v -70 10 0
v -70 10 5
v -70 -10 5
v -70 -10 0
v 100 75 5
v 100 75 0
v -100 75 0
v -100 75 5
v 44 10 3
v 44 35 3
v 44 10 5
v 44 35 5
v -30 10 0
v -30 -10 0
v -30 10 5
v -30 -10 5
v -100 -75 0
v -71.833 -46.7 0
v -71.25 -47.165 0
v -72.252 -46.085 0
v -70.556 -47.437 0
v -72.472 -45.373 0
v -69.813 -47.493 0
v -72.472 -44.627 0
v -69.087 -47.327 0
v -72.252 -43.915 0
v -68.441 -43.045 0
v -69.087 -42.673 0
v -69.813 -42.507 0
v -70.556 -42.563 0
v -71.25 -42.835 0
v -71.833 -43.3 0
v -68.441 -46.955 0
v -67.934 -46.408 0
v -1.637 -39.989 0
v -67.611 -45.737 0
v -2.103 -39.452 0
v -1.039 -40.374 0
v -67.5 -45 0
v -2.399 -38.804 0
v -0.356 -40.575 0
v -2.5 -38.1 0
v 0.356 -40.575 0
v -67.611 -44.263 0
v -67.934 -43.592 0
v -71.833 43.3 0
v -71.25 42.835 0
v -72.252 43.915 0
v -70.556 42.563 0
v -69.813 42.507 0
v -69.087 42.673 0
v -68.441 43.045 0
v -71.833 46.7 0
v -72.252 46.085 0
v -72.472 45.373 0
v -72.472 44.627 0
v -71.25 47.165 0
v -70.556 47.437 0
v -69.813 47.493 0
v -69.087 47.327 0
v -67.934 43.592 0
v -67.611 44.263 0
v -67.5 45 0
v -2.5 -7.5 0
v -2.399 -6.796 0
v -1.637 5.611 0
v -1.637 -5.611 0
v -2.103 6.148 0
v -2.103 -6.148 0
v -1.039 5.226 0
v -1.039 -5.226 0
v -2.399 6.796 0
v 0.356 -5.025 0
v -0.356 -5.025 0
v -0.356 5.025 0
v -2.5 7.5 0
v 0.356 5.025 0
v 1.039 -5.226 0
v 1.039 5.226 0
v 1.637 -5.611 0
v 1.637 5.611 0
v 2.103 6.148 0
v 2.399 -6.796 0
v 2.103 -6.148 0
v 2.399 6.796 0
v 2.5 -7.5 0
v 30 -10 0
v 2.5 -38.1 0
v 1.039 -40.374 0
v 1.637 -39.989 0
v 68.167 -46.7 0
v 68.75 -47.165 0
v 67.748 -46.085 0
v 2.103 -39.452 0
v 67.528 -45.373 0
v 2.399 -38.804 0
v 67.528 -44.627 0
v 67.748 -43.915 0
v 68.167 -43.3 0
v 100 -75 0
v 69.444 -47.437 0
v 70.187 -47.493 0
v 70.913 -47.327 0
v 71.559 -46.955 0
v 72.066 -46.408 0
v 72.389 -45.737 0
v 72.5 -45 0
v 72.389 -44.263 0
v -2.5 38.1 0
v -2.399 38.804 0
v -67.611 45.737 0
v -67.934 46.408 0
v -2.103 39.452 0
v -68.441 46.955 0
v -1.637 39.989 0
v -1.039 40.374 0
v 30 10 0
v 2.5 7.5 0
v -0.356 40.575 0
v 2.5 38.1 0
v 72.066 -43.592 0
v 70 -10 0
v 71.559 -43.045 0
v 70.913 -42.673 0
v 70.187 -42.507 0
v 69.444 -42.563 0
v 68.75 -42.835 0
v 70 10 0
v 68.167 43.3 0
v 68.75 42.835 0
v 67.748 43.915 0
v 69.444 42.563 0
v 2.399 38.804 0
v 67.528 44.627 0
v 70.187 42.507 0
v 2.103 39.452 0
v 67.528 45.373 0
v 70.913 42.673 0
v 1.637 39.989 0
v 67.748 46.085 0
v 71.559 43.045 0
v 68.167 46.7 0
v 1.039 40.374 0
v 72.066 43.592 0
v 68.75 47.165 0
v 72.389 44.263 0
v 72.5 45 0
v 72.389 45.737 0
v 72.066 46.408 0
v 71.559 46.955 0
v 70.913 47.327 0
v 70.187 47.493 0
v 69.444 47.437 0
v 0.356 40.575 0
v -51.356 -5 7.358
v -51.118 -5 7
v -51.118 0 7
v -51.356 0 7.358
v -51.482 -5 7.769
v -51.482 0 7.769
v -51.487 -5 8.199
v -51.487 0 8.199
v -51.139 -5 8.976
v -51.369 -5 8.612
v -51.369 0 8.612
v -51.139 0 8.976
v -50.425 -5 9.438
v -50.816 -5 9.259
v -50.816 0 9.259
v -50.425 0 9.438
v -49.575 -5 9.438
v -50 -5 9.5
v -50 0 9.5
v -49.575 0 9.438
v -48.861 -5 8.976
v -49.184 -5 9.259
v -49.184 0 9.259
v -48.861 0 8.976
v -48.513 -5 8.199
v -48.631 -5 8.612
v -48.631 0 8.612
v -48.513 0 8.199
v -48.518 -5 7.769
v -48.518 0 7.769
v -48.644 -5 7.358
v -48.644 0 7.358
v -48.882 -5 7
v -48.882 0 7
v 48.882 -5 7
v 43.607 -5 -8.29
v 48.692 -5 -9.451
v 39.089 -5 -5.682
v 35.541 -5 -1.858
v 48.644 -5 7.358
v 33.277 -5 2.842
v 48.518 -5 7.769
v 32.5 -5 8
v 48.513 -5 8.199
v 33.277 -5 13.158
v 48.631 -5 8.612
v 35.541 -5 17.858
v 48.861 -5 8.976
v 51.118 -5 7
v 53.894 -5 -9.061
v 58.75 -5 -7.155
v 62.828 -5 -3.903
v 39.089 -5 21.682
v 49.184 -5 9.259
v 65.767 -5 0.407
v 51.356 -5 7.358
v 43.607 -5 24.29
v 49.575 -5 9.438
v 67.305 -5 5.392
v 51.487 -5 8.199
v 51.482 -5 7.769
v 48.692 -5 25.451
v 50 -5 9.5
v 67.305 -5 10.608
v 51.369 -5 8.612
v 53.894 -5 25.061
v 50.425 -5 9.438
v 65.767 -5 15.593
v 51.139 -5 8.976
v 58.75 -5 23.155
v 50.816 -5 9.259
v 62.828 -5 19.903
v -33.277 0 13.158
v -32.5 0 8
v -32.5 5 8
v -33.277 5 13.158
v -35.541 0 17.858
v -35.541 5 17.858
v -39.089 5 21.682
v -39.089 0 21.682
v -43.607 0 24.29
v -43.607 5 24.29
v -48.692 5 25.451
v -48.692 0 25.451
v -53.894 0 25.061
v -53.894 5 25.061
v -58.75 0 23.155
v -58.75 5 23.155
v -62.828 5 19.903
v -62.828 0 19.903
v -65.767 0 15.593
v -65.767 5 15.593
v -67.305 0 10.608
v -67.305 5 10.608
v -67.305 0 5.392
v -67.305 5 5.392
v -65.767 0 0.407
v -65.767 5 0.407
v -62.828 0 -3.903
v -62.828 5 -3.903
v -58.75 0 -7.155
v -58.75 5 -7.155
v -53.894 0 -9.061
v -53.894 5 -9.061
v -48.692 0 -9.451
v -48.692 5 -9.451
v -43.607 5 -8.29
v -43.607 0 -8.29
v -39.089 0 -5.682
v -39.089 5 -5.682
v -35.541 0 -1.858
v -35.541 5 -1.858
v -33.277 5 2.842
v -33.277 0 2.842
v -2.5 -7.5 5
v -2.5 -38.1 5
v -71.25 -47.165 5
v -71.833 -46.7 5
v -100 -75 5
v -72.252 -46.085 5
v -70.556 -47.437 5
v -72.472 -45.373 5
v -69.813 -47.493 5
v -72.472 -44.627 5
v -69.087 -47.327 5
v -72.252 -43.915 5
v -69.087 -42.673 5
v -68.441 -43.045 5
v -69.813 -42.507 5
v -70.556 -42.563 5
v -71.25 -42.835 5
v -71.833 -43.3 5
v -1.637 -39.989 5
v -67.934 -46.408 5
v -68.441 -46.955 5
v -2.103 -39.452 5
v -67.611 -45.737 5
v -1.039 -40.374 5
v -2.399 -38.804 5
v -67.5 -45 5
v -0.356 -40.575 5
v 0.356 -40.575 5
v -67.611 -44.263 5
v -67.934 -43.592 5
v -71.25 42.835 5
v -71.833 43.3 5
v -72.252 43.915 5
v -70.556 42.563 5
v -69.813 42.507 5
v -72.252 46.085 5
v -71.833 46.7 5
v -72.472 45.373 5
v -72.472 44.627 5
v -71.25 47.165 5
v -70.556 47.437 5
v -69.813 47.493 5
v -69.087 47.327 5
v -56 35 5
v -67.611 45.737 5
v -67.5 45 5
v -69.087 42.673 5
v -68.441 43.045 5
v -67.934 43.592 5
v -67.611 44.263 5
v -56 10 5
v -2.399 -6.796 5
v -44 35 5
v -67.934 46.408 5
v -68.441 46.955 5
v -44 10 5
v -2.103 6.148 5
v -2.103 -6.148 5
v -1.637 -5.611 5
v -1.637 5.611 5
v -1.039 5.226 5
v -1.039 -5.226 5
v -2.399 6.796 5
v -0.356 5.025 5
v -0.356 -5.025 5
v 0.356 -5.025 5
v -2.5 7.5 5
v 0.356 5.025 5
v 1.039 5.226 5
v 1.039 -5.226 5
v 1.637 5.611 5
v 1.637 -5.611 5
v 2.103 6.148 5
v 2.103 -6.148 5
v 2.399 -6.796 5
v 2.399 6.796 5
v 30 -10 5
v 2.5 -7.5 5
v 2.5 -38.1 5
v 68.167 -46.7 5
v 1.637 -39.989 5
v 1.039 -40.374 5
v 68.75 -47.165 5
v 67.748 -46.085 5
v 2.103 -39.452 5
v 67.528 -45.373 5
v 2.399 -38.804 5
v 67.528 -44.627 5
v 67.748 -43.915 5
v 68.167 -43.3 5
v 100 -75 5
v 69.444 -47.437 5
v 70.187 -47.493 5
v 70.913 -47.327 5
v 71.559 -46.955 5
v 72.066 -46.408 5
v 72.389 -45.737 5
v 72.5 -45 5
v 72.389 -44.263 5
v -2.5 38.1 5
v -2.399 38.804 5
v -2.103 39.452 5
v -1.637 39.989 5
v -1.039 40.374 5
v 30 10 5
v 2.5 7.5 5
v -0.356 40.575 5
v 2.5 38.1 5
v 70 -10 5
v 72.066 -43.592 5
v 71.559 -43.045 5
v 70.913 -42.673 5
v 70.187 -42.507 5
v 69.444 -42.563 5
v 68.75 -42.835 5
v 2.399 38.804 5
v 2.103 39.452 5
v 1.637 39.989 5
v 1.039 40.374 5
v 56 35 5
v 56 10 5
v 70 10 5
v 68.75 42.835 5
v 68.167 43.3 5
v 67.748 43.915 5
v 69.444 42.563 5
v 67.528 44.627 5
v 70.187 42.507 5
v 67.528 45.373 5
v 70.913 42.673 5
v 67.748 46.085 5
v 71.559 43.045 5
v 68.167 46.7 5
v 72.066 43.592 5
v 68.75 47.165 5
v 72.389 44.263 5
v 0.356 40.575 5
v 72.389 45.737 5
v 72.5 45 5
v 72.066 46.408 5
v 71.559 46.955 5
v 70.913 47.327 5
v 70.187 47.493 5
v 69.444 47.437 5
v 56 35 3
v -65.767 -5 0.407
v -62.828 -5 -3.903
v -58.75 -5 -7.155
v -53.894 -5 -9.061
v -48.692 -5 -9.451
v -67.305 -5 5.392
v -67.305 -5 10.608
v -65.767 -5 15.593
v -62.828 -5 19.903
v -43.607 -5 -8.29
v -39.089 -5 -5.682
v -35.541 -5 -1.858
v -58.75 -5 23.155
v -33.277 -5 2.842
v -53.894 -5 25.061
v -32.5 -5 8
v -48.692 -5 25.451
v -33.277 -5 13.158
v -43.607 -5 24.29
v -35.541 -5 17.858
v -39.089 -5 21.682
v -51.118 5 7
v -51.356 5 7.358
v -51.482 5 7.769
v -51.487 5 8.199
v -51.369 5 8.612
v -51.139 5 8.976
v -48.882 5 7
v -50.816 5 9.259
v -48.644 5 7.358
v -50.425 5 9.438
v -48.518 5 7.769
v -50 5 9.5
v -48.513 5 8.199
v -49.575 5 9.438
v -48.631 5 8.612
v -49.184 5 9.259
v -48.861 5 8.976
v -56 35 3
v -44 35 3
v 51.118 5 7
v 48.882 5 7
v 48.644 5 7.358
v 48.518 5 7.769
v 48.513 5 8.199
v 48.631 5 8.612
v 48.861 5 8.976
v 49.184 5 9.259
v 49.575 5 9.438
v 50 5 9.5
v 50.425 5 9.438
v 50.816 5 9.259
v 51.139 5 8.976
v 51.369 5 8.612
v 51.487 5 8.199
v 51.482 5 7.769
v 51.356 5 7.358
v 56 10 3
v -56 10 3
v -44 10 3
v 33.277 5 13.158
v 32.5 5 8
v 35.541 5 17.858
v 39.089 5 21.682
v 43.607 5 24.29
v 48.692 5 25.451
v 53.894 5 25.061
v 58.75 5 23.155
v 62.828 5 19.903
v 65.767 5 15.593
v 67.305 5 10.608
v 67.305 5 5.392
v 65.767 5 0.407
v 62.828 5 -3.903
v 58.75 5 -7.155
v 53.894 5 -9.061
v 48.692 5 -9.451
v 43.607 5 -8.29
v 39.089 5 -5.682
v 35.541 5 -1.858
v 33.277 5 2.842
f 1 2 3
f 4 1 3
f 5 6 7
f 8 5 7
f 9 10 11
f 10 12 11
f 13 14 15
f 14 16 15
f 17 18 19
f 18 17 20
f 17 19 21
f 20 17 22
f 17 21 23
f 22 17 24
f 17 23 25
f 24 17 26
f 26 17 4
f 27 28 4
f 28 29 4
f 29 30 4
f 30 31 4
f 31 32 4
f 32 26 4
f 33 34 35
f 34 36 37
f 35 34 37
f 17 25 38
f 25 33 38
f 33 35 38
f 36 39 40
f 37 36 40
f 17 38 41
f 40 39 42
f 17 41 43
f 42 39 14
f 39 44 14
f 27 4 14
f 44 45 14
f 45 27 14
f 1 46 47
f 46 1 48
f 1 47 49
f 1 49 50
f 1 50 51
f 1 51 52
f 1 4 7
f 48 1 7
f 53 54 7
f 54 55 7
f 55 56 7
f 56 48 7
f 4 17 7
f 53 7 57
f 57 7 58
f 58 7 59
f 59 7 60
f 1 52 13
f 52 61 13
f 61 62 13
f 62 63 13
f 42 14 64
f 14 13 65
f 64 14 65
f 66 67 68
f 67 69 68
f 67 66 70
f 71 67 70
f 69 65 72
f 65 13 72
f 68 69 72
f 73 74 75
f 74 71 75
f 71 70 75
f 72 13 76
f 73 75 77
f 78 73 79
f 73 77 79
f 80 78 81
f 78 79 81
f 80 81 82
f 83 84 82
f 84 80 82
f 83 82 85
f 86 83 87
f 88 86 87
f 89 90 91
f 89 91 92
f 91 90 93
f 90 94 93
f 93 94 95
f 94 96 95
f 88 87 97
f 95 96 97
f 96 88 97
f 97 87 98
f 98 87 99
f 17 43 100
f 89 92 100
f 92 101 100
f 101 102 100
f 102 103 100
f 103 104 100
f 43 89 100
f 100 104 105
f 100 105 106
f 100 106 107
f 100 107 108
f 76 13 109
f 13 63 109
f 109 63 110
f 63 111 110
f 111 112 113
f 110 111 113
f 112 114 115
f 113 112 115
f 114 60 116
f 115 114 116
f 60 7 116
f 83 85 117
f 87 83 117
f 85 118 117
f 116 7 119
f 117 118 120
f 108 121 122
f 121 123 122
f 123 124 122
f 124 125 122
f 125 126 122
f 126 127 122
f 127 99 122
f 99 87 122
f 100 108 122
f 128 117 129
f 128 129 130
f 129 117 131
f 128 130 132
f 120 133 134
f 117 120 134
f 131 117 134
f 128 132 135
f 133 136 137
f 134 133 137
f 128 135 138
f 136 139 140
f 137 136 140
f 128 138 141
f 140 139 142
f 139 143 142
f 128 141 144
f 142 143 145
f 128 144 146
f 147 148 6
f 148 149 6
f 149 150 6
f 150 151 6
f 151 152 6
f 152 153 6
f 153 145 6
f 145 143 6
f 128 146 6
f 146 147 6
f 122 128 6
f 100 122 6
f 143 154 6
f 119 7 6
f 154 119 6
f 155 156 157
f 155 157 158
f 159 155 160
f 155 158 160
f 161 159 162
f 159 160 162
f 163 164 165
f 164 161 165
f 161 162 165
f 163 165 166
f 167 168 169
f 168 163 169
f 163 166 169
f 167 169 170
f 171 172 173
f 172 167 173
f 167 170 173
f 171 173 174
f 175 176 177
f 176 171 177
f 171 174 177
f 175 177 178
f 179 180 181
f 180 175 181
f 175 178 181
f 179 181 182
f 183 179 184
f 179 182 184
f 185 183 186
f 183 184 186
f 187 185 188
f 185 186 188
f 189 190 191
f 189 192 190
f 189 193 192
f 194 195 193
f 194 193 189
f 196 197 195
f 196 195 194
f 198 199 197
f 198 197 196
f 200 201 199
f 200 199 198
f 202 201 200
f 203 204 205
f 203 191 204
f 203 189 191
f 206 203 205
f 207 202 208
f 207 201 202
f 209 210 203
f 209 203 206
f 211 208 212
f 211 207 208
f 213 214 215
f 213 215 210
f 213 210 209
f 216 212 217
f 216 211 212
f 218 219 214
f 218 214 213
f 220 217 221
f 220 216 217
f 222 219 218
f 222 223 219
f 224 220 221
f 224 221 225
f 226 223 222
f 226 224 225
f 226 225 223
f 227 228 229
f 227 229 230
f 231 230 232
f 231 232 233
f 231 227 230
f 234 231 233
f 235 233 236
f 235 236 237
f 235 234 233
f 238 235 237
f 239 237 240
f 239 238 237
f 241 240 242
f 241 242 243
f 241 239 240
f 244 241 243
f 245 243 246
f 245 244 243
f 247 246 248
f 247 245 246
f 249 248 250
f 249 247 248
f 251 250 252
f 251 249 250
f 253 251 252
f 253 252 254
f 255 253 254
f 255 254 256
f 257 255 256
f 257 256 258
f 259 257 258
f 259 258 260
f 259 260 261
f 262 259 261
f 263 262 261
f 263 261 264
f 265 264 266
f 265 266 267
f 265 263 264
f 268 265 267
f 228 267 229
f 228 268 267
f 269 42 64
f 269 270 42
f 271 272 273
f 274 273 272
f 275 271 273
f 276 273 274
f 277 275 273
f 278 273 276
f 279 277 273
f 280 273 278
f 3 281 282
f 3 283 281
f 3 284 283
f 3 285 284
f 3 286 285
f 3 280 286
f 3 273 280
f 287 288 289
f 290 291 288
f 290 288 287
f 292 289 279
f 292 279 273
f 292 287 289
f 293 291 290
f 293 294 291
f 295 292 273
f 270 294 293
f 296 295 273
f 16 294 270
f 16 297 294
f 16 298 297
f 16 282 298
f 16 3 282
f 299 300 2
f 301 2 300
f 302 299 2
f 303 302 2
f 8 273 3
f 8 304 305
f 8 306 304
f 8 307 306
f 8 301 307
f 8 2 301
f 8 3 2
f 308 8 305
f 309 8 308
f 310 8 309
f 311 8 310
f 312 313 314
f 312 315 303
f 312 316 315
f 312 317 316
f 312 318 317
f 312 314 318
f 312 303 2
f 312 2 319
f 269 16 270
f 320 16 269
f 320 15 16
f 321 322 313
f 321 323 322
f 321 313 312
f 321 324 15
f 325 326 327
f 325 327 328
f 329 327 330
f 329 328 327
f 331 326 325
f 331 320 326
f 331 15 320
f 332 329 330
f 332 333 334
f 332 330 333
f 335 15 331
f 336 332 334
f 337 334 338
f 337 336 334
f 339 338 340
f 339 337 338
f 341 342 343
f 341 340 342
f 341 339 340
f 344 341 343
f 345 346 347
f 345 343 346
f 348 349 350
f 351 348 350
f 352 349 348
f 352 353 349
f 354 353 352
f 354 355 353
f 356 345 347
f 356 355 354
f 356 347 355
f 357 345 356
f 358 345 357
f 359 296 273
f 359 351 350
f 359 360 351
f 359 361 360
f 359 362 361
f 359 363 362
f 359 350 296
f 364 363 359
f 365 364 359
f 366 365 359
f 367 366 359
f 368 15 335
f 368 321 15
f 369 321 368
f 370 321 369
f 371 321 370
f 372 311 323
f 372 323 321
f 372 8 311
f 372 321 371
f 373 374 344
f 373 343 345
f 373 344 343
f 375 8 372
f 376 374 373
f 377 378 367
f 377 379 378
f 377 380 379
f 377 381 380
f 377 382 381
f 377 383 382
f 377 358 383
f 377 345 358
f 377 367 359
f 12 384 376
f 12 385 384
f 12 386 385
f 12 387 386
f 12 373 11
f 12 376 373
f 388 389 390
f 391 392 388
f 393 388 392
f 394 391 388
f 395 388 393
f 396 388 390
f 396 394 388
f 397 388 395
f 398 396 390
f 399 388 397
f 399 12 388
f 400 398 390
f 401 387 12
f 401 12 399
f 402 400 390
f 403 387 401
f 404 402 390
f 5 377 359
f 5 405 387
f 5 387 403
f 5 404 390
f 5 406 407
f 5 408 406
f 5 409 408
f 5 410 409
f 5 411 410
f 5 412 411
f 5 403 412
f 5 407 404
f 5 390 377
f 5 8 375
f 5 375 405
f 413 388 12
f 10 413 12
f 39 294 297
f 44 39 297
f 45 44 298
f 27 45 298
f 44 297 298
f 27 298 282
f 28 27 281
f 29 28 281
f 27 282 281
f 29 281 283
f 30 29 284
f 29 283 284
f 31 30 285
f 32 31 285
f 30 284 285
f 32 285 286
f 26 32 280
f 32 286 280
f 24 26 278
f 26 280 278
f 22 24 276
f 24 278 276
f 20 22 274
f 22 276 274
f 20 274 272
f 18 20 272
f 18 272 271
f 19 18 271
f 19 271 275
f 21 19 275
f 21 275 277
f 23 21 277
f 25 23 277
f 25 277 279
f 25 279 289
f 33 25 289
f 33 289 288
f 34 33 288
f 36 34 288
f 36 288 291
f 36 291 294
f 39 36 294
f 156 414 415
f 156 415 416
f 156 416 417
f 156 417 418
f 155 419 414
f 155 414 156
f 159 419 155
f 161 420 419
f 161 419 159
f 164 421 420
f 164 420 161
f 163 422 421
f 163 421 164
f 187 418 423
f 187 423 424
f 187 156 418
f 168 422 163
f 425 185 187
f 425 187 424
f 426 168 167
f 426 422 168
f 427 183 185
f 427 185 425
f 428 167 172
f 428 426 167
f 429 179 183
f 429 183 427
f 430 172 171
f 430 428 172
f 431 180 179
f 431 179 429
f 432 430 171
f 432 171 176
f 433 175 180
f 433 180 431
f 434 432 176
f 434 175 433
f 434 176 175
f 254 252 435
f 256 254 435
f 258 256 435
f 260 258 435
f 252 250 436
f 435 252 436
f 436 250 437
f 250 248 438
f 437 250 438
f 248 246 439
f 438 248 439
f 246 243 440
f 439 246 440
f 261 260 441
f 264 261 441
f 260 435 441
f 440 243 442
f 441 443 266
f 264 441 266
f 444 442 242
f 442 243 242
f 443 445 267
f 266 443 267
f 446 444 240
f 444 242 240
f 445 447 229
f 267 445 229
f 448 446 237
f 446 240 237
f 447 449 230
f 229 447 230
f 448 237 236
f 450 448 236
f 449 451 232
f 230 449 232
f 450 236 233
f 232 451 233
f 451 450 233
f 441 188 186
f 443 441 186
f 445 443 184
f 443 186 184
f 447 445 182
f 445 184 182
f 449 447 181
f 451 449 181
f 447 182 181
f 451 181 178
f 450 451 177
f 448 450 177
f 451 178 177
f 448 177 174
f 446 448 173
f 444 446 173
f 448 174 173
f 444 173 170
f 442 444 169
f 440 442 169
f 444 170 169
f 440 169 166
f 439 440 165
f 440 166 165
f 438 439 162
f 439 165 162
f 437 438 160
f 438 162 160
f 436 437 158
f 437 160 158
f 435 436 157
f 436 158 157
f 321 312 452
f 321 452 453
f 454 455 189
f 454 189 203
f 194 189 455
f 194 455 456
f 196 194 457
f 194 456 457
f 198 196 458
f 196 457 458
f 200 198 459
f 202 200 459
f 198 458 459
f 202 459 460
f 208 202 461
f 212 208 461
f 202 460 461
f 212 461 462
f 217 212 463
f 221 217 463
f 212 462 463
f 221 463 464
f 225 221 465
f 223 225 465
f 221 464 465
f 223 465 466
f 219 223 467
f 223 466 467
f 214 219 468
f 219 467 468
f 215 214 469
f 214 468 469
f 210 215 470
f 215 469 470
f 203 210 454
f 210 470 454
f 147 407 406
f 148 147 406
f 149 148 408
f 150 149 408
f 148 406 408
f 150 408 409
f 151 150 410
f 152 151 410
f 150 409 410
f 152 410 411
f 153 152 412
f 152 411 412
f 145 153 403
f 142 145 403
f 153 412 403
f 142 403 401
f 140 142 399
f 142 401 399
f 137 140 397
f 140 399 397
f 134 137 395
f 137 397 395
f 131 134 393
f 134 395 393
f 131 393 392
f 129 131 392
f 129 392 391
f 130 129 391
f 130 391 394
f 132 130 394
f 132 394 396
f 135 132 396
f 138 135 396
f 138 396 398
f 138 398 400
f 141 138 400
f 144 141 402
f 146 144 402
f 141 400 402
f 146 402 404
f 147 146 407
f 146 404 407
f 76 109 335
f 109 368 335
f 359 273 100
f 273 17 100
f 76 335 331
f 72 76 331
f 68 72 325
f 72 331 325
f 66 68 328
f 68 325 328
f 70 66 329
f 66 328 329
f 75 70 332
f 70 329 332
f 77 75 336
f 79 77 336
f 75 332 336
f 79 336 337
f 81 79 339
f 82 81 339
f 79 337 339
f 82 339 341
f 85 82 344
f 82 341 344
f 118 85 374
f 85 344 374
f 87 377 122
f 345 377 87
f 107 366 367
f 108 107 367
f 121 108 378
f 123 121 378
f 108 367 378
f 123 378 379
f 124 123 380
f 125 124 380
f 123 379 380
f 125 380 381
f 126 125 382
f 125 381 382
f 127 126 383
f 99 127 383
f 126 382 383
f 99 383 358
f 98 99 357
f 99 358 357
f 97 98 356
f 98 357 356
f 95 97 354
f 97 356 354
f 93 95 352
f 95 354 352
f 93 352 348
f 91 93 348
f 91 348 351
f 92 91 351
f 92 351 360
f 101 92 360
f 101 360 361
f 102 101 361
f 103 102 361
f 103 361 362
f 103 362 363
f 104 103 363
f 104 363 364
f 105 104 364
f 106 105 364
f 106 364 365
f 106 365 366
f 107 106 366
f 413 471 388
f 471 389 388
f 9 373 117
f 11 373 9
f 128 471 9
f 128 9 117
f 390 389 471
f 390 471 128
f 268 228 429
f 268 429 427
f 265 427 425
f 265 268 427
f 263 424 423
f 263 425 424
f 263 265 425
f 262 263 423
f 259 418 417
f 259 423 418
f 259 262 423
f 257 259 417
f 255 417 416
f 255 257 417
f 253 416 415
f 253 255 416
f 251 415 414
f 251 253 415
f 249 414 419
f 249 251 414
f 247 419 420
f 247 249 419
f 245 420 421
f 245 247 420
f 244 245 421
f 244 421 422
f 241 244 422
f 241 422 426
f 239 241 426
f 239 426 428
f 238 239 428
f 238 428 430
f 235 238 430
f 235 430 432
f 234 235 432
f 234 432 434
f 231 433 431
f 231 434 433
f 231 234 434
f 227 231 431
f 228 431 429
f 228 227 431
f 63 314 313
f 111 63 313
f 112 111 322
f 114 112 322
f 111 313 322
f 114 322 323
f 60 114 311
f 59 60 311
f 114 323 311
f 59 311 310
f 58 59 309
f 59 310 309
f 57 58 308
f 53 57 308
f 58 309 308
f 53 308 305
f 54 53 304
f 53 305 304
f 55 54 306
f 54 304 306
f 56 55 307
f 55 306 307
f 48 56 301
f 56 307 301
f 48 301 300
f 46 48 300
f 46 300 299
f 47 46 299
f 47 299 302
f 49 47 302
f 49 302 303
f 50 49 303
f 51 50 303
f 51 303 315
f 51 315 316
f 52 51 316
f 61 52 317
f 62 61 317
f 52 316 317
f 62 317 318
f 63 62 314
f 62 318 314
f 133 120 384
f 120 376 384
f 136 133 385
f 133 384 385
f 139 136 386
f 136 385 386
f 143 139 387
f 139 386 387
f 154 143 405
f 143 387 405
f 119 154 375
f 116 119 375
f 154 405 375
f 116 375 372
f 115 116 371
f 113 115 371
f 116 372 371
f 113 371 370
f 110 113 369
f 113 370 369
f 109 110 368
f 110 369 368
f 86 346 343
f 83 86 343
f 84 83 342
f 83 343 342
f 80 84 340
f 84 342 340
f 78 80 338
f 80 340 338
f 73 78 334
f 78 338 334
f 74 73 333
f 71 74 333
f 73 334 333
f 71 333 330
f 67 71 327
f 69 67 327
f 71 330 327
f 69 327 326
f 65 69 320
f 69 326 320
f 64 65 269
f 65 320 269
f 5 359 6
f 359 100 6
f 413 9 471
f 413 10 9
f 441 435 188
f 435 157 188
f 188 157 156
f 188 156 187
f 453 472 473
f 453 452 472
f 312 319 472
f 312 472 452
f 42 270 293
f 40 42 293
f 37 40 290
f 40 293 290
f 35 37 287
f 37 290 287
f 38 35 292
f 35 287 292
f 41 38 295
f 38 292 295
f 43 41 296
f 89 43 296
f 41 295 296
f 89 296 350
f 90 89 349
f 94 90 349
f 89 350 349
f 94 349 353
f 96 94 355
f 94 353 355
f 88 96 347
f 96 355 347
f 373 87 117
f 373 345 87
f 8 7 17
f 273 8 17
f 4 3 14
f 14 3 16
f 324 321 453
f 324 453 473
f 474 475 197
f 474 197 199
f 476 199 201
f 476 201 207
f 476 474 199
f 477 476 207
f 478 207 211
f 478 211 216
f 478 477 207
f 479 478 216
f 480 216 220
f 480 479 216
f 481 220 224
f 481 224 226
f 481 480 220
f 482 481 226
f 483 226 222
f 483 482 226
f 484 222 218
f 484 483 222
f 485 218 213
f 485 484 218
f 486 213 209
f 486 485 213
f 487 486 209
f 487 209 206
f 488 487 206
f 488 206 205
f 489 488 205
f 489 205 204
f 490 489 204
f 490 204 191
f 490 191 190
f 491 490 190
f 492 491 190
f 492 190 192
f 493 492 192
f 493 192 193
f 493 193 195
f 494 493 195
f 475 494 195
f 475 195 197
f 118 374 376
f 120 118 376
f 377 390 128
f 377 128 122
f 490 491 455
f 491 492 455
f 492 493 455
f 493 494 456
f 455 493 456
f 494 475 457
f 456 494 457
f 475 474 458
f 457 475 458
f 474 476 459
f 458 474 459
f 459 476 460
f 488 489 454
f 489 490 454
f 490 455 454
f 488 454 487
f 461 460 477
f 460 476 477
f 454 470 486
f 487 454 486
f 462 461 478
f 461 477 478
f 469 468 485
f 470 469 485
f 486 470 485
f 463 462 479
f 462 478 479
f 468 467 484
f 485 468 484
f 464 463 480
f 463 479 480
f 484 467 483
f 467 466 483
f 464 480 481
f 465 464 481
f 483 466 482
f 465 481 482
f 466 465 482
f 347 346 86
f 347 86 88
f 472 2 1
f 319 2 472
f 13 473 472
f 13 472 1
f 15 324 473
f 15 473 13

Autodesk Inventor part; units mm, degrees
ref_plane "YZ Plane" through (0, 0, 0) normal (1, 0, 0) x (0, 1, 0)
ref_plane "XZ Plane" through (0, 0, 0) normal (0, 1, 0) x (-1, 0, 0)
ref_plane "XY Plane" through (0, 0, 0) normal (0, 0, 1) x (1, 0, 0)
sketch "Эскиз1" plane through (0, 0, 0) normal (0, 0, 1) x (1, 0, 0)
  line L0 (-100, -75) -> (100, -75)
  line L1 (100, -75) -> (100, 75)
  line L2 (100, 75) -> (-100, 75)
  line L3 (-100, 75) -> (-100, -75)
  line L4 (-100, -75) -> (100, 75) construction
  line L5 (100, -75) -> (-100, 75) construction
  point P0 (0, 0)
  dimension "d0" = 200
  dimension "d1" = 150
extrude "Выдавливание1" add sketch "Эскиз1" along normal blind 5
sketch "Эскиз2" plane through (0, 0, 5) normal (0, 0, 1) x (1, 0, 0)
  line L0 (100, -75) -> (100, 75) construction
  line L1 (100, 0) -> (-100, 0) construction
  line L2 (-100, 75) -> (-100, -75) construction
  line L3 (100, 75) -> (-100, 75) construction
  line L4 (0, 75) -> (0, -75) construction
  line L5 (-100, -75) -> (100, -75) construction
  line L6 (-100, -10) -> (100, -10) construction
  line L7 (100, -10) -> (100, 10) construction
  line L8 (100, 10) -> (-100, 10) construction
  line L9 (-100, 10) -> (-100, -10) construction
  line L10 (-100, -10) -> (100, 10) construction
  line L11 (100, -10) -> (-100, 10) construction
  line L12 (0, 0) -> (-100, 0) construction
  line L13 (-50, 0) -> (-50, 75) construction
  line L14 (0, 0) -> (100, 0) construction
  line L15 (50, 0) -> (50, 75) construction
  line L16 (-56, 10) -> (-56, 35)
  line L17 (-56, 35) -> (-44, 35)
  line L18 (-44, 35) -> (-44, 10)
  line L19 (-56, 10) -> (-44, 10)
  line L20 (56, 10) -> (56, 35)
  line L21 (56, 35) -> (44, 35)
  line L22 (44, 35) -> (44, 10)
  line L23 (56, 10) -> (44, 10)
  line L24 (-70, -10) -> (-30, -10)
  line L25 (-30, -10) -> (-30, 10)
  line L26 (-30, 10) -> (-70, 10)
  line L27 (-70, 10) -> (-70, -10)
  line L28 (-70, -10) -> (-30, 10) construction
  line L29 (-30, -10) -> (-70, 10) construction
  line L30 (70, -10) -> (30, -10)
  line L31 (30, -10) -> (30, 10)
  line L32 (30, 10) -> (70, 10)
  line L33 (70, 10) -> (70, -10)
  dimension "d4" = 20
  dimension "d7" = 25
  dimension "d8" = 40
extrude "Выдавливание2" cut sketch "Эскиз2" against normal blind 2 contours L16 L17 L18 L19 | L23 L22 L21 L20
extrude "Выдавливание3" cut sketch "Эскиз2" against normal blind 5 contours L19 L26 L25 L24 L27 | L32 L33 L30 L31 L23
sketch "Эскиз3" plane through (0, 0, 3) normal (0, 0, 1) x (1, 0, 0)
  line L0 (-56, 10) -> (-56, 35) projected
  line L1 (-44, 10) -> (-56, 10) projected
  line L2 (-44, 35) -> (-44, 10) projected
  line L3 (-56, 35) -> (-44, 35) projected
  line L4 (-44, 35) -> (-44, 10) projected
  point P0 (0, 0)
surface extrude "ВыдавПврх1" sketch "Эскиз3" along normal blind 10 shown yes curves L4 L1 L0 L3
boundary_patch "Участок поверхности1"
sketch "Эскиз4" plane through (-56, 10, 3) normal (0, -1, 0) x (1, 0, 0)
  line L0 (0, 10) -> (12, 10) construction
  line L1 (6, 10) -> (6, 0) construction
  line L2 (12, 0) -> (0, 0) construction
  line L3 (0, 0) -> (0, 10) construction
  line L4 (0, 5) -> (12, 5) construction
  line L5 (12, 0) -> (12, 10) construction
  arc A0 (7.118, 4) -> (4.882, 4) centre (6, 5) ccw
  line L6 (6, 3.5) -> (6, 4) construction
  line L7 (6, 4) -> (7.118, 4)
  line L8 (6, 4) -> (4.882, 4)
  point P0 (56, -3)
  dimension "d17" = 3
  dimension "d18" = 0.5
surface extrude "ВыдавПврх2" sketch "Эскиз4" along normal blind 10 shown yes curves L7 A0 L8
boundary_patch "Участок поверхности2"
mirror "Зеркальное отражение1" about plane through (0, 0, 0) normal (1, 0, 0) of "Участок поверхности1", "ВыдавПврх1", "ВыдавПврх2"
ref_plane "РабПлоскость1" through (-70, 0, 5) normal (0, -1, 0) x (1, 0, 0)
sketch "Эскиз5" plane through (-70, 0, 5) normal (0, -1, 0) x (1, 0, 0)
  arc A0 (21.118, 2) -> (18.882, 2) centre (20, 3) ccw projected
  line L0 (18.882, 2) -> (21.118, 2) projected
  circle A1 centre (20, 3) radius 17.5
  point P0 (70, -5)
  dimension "d23" = 35
extrude "Выдавливание4" add sketch "Эскиз5" along normal mid plane 10
mirror "Зеркальное отражение2" about plane through (0, 0, 0) normal (1, 0, 0) of "Выдавливание4"
sketch "Эскиз6" plane through (0, 0, 5) normal (0, 0, 1) x (1, 0, 0)
  line L0 (-100, -75) -> (100, -75) projected
  line L1 (100, -75) -> (100, 75) projected
  line L2 (100, 75) -> (-100, 75) projected
  line L3 (-100, 75) -> (-100, -75) projected
  line L4 (-44, 10) -> (-30, 10) projected
  line L5 (-30, 10) -> (-30, -10) projected
  line L6 (-30, -10) -> (-70, -10) projected
  line L7 (-70, -10) -> (-70, 10) projected
  line L8 (-70, 10) -> (-56, 10) projected
  line L9 (-56, 10) -> (-56, 35) projected
  line L10 (-56, 35) -> (-44, 35) projected
  line L11 (-44, 35) -> (-44, 10) projected
  line L12 (30, 10) -> (44, 10) projected
  line L13 (44, 10) -> (44, 35) projected
  line L14 (44, 35) -> (56, 35) projected
  line L15 (56, 35) -> (56, 10) projected
  line L16 (56, 10) -> (70, 10) projected
  line L17 (70, 10) -> (70, -10) projected
  line L18 (70, -10) -> (30, -10) projected
  line L19 (30, -10) -> (30, 10) projected
  line L20 (100, -75) -> (70, -75)
  line L21 (70, -75) -> (70, -45) construction
  line L22 (70, -45) -> (100, -45) construction
  line L23 (100, -45) -> (100, -75)
  circle A0 centre (70, -45) radius 2.5
  line L24 (-100, 0) -> (100, 0) construction
  line L25 (100, 75) -> (-100, 75) construction
  line L26 (0, 75) -> (0, -75) construction
  circle A1 centre (-70, -45) radius 2.5
  circle A2 centre (70, 45) radius 2.5
  circle A3 centre (-70, 45) radius 2.5
  point P0 (0, 0)
  dimension "d26" = 30
  dimension "d27" = 30
  dimension "d28" = 5
extrude "Выдавливание5" cut sketch "Эскиз6" against normal blind 10 contours A0 | A1 | A2 | A3
sketch "Эскиз7" plane through (0, 0, 5) normal (0, 0, 1) x (1, 0, 0)
  circle A0 centre (-70, 45) radius 2.5 projected
  circle A1 centre (70, -45) radius 2.5 projected
  circle A2 centre (-70, -45) radius 2.5 projected
  circle A3 centre (70, 45) radius 2.5 projected
  line L0 (-100, -75) -> (100, -75) projected
  line L1 (100, -75) -> (100, 75) projected
  line L2 (100, 75) -> (-100, 75) projected
  line L3 (-100, 75) -> (-100, -75) projected
  line L4 (-44, 10) -> (-30, 10) projected
  line L5 (-30, 10) -> (-30, -10) projected
  line L6 (-30, -10) -> (-70, -10) projected
  line L7 (-70, -10) -> (-70, 10) projected
  line L8 (-70, 10) -> (-56, 10) projected
  line L9 (-56, 10) -> (-56, 35) projected
  line L10 (-56, 35) -> (-44, 35) projected
  line L11 (-44, 35) -> (-44, 10) projected
  line L12 (30, 10) -> (44, 10) projected
  line L13 (44, 10) -> (44, 35) projected
  line L14 (44, 35) -> (56, 35) projected
  line L15 (56, 35) -> (56, 10) projected
  line L16 (56, 10) -> (70, 10) projected
  line L17 (70, 10) -> (70, -10) projected
  line L18 (70, -10) -> (30, -10) projected
  line L19 (30, -10) -> (30, 10) projected
  line L20 (100, 75) -> (-100, 75) construction
  line L21 (-30, 10) -> (30, 10) construction
  line L22 (30, 10) -> (30, 75) construction
  line L23 (30, 75) -> (-30, 75) construction
  line L24 (-30, 75) -> (-30, 10) construction
  line L25 (-100, -75) -> (100, -75) construction
  line L26 (-30, -10) -> (30, -10) construction
  line L27 (30, -10) -> (30, -75) construction
  line L28 (30, -75) -> (-30, -75) construction
  line L29 (-30, -75) -> (-30, -10) construction
  line L30 (100, -75) -> (100, 75) construction
  line L31 (100, -7.5) -> (100, 7.5) construction
  line L32 (100, 7.5) -> (-100, 7.5) construction
  line L33 (-100, 7.5) -> (-100, -7.5) construction
  line L34 (-100, -7.5) -> (100, 7.5) construction
  line L35 (100, -7.5) -> (-100, 7.5) construction
  line L36 (-100, -7.5) -> (-2.5, -7.5) construction
  line L37 (2.5, -7.5) -> (100, -7.5) construction
  line L38 (-100, 75) -> (-100, -75) construction
  line L39 (-100, 0) -> (100, 0) construction
  arc A4 (-2.5, 7.5) -> (2.5, 7.5) centre (0, 7.5) ccw
  line L40 (2.5, 7.5) -> (2.5, 38.1)
  line L41 (-2.5, 38.1) -> (-2.5, 7.5)
  arc A5 (2.5, 38.1) -> (-2.5, 38.1) centre (0, 38.1) ccw
  line L42 (-2.5, 38.1) -> (-2.5, 7.5)
  line L43 (2.5, 7.5) -> (2.5, 38.1)
  line L44 (-2.5, -38.1) -> (-2.5, -7.5)
  line L45 (2.5, -7.5) -> (2.5, -38.1)
  arc A6 (-2.5, -38.1) -> (2.5, -38.1) centre (0, -38.1) ccw
  arc A7 (2.5, -7.5) -> (-2.5, -7.5) centre (0, -7.5) ccw
  point P0 (0, 0)
  dimension "d31" = 15
extrude "Выдавливание7" cut sketch "Эскиз7" against normal blind 10 contours L41 A5 L40 A4 | L44 A7 L45 A6
properties part number "Top"
